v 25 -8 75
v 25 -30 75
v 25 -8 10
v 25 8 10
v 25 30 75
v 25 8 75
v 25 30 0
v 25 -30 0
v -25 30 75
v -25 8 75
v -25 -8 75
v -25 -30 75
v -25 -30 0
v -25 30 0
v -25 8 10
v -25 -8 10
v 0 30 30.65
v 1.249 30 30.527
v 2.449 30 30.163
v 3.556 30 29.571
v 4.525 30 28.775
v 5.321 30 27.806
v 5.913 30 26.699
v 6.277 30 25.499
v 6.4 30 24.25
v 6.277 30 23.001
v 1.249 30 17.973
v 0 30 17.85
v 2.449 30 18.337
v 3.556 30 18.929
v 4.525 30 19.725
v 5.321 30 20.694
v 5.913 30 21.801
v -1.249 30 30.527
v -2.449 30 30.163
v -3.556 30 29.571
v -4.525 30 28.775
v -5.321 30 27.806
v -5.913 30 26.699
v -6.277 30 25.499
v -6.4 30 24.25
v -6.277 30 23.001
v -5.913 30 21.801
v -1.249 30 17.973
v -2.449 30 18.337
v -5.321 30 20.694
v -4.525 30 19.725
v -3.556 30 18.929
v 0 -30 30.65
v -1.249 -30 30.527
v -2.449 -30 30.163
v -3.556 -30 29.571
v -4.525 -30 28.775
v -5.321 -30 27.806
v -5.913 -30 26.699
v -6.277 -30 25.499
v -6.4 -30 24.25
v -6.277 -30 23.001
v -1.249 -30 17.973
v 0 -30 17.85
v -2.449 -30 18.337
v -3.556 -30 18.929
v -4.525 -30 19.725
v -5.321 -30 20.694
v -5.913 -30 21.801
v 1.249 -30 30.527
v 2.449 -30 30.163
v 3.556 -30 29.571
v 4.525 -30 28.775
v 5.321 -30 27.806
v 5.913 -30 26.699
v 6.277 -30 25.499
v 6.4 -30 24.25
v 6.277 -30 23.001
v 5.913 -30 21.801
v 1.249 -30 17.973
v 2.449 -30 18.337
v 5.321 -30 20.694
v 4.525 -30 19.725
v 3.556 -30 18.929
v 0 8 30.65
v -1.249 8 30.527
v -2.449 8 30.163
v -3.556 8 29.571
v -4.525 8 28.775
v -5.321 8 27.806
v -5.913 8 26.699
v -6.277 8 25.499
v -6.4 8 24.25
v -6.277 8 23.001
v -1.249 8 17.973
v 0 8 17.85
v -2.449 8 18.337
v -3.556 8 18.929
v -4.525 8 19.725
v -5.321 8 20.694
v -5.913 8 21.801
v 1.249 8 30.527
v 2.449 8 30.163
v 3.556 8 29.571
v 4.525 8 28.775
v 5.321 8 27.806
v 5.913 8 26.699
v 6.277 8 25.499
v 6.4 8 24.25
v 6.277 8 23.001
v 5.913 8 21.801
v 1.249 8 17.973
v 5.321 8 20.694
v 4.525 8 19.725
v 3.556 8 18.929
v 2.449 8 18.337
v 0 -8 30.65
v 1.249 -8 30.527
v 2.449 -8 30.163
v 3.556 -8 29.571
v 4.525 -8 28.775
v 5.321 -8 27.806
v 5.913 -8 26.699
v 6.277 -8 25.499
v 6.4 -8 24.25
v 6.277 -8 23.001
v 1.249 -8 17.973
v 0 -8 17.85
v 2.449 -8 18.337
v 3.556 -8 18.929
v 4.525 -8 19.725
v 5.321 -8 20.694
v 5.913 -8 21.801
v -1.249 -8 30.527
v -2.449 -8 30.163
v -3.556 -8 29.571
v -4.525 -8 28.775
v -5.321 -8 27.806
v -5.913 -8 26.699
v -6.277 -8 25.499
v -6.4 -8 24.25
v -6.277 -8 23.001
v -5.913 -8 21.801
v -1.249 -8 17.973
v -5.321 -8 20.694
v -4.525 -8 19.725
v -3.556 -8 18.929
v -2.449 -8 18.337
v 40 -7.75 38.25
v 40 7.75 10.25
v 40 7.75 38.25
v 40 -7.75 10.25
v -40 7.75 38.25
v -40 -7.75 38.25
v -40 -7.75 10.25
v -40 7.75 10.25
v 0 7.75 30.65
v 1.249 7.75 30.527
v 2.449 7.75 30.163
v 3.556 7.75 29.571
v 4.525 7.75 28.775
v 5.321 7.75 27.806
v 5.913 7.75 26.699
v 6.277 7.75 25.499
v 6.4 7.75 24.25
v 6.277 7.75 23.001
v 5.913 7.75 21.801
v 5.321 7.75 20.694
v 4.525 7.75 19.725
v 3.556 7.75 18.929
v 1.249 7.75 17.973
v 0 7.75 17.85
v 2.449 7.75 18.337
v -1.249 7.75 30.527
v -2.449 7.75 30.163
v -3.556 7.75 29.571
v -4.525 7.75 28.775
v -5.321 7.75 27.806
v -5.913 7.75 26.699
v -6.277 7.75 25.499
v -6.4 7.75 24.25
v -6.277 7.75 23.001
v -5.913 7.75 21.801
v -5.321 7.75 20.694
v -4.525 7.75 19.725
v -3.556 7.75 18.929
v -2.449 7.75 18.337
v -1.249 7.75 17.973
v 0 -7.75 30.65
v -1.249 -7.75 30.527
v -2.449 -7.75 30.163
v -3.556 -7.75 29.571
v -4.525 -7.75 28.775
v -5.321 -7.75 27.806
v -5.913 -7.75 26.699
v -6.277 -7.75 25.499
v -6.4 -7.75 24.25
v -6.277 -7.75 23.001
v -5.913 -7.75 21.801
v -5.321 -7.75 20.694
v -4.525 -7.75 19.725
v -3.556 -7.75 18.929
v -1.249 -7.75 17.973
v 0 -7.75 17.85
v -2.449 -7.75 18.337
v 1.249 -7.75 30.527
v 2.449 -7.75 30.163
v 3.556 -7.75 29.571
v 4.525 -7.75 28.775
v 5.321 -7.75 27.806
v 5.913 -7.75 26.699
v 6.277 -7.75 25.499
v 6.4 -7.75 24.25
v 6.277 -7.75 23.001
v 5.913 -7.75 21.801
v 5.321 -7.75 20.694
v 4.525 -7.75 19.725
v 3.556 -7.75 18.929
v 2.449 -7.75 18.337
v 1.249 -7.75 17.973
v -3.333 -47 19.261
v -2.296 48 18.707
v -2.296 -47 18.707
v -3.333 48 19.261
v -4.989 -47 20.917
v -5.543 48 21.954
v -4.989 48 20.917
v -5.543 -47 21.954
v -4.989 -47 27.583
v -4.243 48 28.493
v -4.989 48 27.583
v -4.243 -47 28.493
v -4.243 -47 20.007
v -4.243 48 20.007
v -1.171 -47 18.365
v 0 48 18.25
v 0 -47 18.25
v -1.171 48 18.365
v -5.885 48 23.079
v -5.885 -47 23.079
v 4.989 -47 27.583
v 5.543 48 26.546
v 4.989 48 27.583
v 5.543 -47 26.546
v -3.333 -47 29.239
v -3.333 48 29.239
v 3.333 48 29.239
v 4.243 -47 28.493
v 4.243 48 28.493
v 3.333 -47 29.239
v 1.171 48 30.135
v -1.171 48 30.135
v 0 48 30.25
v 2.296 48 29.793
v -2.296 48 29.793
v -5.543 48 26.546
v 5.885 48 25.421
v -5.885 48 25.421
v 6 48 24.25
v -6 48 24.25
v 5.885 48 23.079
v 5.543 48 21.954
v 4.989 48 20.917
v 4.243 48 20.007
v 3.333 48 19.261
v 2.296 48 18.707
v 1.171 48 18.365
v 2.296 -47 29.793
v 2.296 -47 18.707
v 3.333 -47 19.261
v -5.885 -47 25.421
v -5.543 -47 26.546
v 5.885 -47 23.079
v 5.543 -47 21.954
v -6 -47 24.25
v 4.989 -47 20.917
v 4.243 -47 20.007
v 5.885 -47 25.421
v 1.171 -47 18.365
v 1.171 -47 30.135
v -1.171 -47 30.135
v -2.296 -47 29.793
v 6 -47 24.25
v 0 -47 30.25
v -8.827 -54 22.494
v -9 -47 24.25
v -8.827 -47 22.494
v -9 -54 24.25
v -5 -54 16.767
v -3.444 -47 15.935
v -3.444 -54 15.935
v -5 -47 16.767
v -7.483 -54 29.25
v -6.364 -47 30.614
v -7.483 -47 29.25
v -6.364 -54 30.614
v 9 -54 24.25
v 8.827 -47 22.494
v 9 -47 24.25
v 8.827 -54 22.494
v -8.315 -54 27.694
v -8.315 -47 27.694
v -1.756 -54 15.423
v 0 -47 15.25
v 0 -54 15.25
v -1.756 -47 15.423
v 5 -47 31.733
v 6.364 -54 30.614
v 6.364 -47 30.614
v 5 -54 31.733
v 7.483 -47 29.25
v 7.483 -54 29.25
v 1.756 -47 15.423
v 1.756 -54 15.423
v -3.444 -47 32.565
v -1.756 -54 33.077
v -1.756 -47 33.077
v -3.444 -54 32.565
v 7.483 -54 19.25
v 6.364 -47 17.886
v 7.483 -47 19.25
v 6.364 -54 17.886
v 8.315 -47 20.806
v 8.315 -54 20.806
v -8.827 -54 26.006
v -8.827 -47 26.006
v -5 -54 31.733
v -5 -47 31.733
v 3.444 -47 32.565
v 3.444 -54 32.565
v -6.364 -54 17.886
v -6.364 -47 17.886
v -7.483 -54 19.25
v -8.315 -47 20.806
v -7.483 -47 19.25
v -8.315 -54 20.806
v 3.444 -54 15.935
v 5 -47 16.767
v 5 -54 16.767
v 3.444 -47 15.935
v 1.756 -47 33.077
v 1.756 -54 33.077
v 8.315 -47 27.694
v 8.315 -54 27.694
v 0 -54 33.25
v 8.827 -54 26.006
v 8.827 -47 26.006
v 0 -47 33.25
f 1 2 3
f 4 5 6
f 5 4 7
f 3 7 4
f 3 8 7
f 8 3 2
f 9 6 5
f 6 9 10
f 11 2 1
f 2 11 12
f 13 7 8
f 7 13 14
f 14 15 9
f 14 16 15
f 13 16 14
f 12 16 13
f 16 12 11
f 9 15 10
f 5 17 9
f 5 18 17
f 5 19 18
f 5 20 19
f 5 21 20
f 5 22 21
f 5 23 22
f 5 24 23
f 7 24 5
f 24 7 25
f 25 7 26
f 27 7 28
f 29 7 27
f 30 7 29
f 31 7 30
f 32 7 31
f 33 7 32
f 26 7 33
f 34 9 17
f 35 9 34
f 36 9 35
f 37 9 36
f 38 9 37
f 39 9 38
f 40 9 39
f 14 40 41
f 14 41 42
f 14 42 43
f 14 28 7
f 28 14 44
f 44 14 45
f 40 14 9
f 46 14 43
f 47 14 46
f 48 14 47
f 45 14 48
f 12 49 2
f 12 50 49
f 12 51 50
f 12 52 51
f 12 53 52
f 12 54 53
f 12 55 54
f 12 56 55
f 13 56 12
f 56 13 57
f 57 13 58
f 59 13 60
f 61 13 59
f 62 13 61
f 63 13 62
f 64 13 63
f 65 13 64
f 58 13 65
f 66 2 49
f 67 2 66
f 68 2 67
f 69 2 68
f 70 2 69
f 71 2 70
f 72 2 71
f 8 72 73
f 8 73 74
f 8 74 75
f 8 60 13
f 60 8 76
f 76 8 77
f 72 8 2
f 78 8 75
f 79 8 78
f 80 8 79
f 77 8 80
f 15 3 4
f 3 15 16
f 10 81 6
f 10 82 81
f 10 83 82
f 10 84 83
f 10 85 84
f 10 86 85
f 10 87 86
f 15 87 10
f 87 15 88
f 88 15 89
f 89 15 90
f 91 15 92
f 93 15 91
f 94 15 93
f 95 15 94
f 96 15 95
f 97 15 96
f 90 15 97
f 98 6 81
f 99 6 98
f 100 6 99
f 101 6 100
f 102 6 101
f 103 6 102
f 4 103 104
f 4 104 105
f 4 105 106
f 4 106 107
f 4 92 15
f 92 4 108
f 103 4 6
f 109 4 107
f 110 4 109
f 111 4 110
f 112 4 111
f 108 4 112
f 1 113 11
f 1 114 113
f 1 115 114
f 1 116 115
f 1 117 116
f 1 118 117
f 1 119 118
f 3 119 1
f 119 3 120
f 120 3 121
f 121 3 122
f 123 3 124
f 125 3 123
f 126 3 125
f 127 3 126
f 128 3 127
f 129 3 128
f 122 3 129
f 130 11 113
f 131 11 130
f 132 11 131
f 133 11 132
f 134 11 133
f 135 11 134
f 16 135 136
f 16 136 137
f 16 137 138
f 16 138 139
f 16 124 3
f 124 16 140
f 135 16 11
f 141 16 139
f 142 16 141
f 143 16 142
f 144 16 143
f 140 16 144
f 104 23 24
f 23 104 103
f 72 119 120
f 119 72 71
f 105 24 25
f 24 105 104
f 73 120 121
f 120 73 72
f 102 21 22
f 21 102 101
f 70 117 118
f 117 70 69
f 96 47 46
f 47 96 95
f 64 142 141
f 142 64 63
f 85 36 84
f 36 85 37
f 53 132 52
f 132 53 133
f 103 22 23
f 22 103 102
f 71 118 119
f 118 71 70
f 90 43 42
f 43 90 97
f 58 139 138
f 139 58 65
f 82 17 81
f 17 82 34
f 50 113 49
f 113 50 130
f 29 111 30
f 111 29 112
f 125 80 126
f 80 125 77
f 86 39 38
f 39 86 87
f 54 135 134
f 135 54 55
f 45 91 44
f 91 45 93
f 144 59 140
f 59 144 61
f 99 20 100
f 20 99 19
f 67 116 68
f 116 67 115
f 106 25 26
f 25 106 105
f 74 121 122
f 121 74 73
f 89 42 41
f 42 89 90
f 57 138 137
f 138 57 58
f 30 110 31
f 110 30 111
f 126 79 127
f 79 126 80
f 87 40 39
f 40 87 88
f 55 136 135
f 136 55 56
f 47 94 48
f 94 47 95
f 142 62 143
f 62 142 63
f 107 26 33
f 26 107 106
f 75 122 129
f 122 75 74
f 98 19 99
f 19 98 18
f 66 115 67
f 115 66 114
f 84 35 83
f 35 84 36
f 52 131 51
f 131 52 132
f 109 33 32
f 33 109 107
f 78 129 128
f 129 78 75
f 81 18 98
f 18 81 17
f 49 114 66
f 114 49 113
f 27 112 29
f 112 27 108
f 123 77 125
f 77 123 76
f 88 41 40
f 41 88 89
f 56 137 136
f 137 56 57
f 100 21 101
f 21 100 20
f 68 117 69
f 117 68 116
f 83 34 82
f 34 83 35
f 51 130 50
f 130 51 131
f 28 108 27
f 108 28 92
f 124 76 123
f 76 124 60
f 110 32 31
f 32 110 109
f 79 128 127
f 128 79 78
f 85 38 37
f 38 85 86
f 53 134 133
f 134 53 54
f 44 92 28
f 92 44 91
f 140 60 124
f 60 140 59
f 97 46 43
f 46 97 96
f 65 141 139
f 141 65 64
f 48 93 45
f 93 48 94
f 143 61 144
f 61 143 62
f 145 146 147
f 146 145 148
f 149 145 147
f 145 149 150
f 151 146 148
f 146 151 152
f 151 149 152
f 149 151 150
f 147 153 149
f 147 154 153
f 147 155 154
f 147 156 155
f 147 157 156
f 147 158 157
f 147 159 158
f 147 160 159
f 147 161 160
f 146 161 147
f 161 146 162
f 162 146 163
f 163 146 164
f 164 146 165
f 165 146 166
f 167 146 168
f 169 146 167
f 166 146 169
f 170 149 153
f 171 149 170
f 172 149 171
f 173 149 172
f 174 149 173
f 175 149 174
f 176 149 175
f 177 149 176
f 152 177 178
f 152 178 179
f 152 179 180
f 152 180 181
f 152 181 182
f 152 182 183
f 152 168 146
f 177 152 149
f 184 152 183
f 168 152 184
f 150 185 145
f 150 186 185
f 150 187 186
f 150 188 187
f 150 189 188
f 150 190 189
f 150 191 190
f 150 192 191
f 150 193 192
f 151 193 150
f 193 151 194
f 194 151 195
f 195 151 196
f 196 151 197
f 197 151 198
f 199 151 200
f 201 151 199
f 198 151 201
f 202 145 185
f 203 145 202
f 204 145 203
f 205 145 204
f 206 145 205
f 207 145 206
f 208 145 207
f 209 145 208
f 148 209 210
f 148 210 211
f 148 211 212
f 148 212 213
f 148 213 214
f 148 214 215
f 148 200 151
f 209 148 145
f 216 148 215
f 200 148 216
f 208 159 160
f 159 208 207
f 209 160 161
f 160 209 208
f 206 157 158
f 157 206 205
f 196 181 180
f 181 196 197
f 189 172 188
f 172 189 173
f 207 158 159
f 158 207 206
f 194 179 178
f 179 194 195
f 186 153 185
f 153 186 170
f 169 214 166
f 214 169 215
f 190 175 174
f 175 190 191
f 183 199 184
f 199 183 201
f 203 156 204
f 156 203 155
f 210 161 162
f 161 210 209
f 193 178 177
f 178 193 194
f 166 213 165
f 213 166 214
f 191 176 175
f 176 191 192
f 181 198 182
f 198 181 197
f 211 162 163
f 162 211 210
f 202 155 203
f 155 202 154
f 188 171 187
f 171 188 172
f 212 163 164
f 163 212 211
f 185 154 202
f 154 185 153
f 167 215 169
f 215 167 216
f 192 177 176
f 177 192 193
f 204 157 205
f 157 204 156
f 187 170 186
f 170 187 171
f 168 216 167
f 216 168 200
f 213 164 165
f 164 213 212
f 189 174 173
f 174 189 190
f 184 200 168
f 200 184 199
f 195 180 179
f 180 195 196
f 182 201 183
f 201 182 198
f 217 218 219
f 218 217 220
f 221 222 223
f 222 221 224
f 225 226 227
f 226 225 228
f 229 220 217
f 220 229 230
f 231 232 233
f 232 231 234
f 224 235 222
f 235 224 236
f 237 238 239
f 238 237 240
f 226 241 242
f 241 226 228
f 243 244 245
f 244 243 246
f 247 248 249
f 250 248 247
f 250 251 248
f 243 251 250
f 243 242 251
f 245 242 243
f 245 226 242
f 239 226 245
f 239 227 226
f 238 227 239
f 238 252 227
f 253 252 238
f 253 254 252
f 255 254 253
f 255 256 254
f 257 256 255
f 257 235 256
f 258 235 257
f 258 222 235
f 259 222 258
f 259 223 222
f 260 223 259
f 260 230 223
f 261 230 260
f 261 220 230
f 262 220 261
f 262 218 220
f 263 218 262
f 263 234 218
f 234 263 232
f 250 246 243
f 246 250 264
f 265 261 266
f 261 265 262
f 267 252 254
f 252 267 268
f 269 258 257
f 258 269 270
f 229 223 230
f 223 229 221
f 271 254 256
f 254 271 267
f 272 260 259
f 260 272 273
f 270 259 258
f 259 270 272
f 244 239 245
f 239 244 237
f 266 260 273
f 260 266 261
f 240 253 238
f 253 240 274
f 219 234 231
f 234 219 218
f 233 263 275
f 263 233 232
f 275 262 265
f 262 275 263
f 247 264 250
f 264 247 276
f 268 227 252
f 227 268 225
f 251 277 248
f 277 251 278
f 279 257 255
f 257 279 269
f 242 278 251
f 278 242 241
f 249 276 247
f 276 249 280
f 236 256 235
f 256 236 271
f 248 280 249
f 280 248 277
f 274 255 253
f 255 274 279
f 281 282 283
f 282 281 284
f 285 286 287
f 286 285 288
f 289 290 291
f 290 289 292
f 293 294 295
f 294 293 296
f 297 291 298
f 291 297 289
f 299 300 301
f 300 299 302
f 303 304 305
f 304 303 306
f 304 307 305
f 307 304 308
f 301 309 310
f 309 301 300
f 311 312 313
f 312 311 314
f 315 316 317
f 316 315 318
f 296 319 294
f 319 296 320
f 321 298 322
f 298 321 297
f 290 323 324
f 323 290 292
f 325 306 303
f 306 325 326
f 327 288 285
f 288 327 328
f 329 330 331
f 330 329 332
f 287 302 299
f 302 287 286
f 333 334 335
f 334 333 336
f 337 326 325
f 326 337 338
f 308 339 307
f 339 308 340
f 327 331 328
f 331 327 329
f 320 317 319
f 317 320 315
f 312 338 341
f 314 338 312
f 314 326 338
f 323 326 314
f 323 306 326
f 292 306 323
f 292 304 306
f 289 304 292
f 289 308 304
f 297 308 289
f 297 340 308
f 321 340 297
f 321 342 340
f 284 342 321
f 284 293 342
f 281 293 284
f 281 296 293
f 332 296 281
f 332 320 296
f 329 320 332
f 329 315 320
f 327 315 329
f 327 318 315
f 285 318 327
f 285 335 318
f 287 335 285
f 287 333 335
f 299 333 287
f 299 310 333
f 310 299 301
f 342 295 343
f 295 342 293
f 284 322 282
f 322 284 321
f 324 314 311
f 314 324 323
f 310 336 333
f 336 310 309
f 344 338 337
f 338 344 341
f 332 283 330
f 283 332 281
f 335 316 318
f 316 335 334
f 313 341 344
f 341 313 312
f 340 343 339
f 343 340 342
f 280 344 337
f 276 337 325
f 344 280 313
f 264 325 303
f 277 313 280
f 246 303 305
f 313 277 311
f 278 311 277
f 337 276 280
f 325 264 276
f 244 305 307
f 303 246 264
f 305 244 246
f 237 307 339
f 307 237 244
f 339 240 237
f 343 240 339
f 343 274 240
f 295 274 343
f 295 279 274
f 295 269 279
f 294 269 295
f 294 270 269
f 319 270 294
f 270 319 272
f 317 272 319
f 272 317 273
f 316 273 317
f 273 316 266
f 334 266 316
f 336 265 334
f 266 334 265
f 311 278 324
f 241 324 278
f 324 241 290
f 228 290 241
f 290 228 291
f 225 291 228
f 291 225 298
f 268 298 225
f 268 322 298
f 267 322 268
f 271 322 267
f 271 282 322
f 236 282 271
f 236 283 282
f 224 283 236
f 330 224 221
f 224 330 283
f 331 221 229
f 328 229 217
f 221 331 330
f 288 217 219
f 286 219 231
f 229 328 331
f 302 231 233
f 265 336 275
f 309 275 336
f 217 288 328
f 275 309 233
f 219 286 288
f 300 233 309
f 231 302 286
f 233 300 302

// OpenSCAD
$fn = 32;

// ------------------------------------------------------------------------
// Clevis joint: 50 mm clevis, pin d12
// Every part is its own module, assembly() places them once.
// ------------------------------------------------------------------------

// --- part 1 ---
module clevis() {
  difference() {
    translate([-25, -30, 0]) cube([50, 60, 75]);
    translate([-26, -8, 10]) cube([52, 16, 66]);
    translate([0, 0, 24.25]) rotate([90, 0, 0]) cylinder(h = 62, d = 12.8, center = true);
  }
}

// --- part 2 ---
module eye() {
  difference() {
    translate([-40, -7.75, 0]) cube([80, 15.5, 28]);
    translate([0, 0, 14]) rotate([90, 0, 0]) cylinder(h = 17.5, d = 12.8, center = true);
  }
}

// --- part 3 ---
module pin() {
  rotate([0, 90, 0]) cylinder(h = 96, d = 12, center = true);
  translate([-54, 0, 0]) rotate([0, 90, 0]) cylinder(h = 7, d = 18);
}

// --- assembly ---
module assembly() {
  translate([0, 0, 0]) rotate([0, 0, 0]) clevis();
  translate([0, 0, 10.25]) rotate([0, 0, 0]) eye();
  translate([0, 0, 24.25]) rotate([0, 0, 90]) pin();
}

assembly();
